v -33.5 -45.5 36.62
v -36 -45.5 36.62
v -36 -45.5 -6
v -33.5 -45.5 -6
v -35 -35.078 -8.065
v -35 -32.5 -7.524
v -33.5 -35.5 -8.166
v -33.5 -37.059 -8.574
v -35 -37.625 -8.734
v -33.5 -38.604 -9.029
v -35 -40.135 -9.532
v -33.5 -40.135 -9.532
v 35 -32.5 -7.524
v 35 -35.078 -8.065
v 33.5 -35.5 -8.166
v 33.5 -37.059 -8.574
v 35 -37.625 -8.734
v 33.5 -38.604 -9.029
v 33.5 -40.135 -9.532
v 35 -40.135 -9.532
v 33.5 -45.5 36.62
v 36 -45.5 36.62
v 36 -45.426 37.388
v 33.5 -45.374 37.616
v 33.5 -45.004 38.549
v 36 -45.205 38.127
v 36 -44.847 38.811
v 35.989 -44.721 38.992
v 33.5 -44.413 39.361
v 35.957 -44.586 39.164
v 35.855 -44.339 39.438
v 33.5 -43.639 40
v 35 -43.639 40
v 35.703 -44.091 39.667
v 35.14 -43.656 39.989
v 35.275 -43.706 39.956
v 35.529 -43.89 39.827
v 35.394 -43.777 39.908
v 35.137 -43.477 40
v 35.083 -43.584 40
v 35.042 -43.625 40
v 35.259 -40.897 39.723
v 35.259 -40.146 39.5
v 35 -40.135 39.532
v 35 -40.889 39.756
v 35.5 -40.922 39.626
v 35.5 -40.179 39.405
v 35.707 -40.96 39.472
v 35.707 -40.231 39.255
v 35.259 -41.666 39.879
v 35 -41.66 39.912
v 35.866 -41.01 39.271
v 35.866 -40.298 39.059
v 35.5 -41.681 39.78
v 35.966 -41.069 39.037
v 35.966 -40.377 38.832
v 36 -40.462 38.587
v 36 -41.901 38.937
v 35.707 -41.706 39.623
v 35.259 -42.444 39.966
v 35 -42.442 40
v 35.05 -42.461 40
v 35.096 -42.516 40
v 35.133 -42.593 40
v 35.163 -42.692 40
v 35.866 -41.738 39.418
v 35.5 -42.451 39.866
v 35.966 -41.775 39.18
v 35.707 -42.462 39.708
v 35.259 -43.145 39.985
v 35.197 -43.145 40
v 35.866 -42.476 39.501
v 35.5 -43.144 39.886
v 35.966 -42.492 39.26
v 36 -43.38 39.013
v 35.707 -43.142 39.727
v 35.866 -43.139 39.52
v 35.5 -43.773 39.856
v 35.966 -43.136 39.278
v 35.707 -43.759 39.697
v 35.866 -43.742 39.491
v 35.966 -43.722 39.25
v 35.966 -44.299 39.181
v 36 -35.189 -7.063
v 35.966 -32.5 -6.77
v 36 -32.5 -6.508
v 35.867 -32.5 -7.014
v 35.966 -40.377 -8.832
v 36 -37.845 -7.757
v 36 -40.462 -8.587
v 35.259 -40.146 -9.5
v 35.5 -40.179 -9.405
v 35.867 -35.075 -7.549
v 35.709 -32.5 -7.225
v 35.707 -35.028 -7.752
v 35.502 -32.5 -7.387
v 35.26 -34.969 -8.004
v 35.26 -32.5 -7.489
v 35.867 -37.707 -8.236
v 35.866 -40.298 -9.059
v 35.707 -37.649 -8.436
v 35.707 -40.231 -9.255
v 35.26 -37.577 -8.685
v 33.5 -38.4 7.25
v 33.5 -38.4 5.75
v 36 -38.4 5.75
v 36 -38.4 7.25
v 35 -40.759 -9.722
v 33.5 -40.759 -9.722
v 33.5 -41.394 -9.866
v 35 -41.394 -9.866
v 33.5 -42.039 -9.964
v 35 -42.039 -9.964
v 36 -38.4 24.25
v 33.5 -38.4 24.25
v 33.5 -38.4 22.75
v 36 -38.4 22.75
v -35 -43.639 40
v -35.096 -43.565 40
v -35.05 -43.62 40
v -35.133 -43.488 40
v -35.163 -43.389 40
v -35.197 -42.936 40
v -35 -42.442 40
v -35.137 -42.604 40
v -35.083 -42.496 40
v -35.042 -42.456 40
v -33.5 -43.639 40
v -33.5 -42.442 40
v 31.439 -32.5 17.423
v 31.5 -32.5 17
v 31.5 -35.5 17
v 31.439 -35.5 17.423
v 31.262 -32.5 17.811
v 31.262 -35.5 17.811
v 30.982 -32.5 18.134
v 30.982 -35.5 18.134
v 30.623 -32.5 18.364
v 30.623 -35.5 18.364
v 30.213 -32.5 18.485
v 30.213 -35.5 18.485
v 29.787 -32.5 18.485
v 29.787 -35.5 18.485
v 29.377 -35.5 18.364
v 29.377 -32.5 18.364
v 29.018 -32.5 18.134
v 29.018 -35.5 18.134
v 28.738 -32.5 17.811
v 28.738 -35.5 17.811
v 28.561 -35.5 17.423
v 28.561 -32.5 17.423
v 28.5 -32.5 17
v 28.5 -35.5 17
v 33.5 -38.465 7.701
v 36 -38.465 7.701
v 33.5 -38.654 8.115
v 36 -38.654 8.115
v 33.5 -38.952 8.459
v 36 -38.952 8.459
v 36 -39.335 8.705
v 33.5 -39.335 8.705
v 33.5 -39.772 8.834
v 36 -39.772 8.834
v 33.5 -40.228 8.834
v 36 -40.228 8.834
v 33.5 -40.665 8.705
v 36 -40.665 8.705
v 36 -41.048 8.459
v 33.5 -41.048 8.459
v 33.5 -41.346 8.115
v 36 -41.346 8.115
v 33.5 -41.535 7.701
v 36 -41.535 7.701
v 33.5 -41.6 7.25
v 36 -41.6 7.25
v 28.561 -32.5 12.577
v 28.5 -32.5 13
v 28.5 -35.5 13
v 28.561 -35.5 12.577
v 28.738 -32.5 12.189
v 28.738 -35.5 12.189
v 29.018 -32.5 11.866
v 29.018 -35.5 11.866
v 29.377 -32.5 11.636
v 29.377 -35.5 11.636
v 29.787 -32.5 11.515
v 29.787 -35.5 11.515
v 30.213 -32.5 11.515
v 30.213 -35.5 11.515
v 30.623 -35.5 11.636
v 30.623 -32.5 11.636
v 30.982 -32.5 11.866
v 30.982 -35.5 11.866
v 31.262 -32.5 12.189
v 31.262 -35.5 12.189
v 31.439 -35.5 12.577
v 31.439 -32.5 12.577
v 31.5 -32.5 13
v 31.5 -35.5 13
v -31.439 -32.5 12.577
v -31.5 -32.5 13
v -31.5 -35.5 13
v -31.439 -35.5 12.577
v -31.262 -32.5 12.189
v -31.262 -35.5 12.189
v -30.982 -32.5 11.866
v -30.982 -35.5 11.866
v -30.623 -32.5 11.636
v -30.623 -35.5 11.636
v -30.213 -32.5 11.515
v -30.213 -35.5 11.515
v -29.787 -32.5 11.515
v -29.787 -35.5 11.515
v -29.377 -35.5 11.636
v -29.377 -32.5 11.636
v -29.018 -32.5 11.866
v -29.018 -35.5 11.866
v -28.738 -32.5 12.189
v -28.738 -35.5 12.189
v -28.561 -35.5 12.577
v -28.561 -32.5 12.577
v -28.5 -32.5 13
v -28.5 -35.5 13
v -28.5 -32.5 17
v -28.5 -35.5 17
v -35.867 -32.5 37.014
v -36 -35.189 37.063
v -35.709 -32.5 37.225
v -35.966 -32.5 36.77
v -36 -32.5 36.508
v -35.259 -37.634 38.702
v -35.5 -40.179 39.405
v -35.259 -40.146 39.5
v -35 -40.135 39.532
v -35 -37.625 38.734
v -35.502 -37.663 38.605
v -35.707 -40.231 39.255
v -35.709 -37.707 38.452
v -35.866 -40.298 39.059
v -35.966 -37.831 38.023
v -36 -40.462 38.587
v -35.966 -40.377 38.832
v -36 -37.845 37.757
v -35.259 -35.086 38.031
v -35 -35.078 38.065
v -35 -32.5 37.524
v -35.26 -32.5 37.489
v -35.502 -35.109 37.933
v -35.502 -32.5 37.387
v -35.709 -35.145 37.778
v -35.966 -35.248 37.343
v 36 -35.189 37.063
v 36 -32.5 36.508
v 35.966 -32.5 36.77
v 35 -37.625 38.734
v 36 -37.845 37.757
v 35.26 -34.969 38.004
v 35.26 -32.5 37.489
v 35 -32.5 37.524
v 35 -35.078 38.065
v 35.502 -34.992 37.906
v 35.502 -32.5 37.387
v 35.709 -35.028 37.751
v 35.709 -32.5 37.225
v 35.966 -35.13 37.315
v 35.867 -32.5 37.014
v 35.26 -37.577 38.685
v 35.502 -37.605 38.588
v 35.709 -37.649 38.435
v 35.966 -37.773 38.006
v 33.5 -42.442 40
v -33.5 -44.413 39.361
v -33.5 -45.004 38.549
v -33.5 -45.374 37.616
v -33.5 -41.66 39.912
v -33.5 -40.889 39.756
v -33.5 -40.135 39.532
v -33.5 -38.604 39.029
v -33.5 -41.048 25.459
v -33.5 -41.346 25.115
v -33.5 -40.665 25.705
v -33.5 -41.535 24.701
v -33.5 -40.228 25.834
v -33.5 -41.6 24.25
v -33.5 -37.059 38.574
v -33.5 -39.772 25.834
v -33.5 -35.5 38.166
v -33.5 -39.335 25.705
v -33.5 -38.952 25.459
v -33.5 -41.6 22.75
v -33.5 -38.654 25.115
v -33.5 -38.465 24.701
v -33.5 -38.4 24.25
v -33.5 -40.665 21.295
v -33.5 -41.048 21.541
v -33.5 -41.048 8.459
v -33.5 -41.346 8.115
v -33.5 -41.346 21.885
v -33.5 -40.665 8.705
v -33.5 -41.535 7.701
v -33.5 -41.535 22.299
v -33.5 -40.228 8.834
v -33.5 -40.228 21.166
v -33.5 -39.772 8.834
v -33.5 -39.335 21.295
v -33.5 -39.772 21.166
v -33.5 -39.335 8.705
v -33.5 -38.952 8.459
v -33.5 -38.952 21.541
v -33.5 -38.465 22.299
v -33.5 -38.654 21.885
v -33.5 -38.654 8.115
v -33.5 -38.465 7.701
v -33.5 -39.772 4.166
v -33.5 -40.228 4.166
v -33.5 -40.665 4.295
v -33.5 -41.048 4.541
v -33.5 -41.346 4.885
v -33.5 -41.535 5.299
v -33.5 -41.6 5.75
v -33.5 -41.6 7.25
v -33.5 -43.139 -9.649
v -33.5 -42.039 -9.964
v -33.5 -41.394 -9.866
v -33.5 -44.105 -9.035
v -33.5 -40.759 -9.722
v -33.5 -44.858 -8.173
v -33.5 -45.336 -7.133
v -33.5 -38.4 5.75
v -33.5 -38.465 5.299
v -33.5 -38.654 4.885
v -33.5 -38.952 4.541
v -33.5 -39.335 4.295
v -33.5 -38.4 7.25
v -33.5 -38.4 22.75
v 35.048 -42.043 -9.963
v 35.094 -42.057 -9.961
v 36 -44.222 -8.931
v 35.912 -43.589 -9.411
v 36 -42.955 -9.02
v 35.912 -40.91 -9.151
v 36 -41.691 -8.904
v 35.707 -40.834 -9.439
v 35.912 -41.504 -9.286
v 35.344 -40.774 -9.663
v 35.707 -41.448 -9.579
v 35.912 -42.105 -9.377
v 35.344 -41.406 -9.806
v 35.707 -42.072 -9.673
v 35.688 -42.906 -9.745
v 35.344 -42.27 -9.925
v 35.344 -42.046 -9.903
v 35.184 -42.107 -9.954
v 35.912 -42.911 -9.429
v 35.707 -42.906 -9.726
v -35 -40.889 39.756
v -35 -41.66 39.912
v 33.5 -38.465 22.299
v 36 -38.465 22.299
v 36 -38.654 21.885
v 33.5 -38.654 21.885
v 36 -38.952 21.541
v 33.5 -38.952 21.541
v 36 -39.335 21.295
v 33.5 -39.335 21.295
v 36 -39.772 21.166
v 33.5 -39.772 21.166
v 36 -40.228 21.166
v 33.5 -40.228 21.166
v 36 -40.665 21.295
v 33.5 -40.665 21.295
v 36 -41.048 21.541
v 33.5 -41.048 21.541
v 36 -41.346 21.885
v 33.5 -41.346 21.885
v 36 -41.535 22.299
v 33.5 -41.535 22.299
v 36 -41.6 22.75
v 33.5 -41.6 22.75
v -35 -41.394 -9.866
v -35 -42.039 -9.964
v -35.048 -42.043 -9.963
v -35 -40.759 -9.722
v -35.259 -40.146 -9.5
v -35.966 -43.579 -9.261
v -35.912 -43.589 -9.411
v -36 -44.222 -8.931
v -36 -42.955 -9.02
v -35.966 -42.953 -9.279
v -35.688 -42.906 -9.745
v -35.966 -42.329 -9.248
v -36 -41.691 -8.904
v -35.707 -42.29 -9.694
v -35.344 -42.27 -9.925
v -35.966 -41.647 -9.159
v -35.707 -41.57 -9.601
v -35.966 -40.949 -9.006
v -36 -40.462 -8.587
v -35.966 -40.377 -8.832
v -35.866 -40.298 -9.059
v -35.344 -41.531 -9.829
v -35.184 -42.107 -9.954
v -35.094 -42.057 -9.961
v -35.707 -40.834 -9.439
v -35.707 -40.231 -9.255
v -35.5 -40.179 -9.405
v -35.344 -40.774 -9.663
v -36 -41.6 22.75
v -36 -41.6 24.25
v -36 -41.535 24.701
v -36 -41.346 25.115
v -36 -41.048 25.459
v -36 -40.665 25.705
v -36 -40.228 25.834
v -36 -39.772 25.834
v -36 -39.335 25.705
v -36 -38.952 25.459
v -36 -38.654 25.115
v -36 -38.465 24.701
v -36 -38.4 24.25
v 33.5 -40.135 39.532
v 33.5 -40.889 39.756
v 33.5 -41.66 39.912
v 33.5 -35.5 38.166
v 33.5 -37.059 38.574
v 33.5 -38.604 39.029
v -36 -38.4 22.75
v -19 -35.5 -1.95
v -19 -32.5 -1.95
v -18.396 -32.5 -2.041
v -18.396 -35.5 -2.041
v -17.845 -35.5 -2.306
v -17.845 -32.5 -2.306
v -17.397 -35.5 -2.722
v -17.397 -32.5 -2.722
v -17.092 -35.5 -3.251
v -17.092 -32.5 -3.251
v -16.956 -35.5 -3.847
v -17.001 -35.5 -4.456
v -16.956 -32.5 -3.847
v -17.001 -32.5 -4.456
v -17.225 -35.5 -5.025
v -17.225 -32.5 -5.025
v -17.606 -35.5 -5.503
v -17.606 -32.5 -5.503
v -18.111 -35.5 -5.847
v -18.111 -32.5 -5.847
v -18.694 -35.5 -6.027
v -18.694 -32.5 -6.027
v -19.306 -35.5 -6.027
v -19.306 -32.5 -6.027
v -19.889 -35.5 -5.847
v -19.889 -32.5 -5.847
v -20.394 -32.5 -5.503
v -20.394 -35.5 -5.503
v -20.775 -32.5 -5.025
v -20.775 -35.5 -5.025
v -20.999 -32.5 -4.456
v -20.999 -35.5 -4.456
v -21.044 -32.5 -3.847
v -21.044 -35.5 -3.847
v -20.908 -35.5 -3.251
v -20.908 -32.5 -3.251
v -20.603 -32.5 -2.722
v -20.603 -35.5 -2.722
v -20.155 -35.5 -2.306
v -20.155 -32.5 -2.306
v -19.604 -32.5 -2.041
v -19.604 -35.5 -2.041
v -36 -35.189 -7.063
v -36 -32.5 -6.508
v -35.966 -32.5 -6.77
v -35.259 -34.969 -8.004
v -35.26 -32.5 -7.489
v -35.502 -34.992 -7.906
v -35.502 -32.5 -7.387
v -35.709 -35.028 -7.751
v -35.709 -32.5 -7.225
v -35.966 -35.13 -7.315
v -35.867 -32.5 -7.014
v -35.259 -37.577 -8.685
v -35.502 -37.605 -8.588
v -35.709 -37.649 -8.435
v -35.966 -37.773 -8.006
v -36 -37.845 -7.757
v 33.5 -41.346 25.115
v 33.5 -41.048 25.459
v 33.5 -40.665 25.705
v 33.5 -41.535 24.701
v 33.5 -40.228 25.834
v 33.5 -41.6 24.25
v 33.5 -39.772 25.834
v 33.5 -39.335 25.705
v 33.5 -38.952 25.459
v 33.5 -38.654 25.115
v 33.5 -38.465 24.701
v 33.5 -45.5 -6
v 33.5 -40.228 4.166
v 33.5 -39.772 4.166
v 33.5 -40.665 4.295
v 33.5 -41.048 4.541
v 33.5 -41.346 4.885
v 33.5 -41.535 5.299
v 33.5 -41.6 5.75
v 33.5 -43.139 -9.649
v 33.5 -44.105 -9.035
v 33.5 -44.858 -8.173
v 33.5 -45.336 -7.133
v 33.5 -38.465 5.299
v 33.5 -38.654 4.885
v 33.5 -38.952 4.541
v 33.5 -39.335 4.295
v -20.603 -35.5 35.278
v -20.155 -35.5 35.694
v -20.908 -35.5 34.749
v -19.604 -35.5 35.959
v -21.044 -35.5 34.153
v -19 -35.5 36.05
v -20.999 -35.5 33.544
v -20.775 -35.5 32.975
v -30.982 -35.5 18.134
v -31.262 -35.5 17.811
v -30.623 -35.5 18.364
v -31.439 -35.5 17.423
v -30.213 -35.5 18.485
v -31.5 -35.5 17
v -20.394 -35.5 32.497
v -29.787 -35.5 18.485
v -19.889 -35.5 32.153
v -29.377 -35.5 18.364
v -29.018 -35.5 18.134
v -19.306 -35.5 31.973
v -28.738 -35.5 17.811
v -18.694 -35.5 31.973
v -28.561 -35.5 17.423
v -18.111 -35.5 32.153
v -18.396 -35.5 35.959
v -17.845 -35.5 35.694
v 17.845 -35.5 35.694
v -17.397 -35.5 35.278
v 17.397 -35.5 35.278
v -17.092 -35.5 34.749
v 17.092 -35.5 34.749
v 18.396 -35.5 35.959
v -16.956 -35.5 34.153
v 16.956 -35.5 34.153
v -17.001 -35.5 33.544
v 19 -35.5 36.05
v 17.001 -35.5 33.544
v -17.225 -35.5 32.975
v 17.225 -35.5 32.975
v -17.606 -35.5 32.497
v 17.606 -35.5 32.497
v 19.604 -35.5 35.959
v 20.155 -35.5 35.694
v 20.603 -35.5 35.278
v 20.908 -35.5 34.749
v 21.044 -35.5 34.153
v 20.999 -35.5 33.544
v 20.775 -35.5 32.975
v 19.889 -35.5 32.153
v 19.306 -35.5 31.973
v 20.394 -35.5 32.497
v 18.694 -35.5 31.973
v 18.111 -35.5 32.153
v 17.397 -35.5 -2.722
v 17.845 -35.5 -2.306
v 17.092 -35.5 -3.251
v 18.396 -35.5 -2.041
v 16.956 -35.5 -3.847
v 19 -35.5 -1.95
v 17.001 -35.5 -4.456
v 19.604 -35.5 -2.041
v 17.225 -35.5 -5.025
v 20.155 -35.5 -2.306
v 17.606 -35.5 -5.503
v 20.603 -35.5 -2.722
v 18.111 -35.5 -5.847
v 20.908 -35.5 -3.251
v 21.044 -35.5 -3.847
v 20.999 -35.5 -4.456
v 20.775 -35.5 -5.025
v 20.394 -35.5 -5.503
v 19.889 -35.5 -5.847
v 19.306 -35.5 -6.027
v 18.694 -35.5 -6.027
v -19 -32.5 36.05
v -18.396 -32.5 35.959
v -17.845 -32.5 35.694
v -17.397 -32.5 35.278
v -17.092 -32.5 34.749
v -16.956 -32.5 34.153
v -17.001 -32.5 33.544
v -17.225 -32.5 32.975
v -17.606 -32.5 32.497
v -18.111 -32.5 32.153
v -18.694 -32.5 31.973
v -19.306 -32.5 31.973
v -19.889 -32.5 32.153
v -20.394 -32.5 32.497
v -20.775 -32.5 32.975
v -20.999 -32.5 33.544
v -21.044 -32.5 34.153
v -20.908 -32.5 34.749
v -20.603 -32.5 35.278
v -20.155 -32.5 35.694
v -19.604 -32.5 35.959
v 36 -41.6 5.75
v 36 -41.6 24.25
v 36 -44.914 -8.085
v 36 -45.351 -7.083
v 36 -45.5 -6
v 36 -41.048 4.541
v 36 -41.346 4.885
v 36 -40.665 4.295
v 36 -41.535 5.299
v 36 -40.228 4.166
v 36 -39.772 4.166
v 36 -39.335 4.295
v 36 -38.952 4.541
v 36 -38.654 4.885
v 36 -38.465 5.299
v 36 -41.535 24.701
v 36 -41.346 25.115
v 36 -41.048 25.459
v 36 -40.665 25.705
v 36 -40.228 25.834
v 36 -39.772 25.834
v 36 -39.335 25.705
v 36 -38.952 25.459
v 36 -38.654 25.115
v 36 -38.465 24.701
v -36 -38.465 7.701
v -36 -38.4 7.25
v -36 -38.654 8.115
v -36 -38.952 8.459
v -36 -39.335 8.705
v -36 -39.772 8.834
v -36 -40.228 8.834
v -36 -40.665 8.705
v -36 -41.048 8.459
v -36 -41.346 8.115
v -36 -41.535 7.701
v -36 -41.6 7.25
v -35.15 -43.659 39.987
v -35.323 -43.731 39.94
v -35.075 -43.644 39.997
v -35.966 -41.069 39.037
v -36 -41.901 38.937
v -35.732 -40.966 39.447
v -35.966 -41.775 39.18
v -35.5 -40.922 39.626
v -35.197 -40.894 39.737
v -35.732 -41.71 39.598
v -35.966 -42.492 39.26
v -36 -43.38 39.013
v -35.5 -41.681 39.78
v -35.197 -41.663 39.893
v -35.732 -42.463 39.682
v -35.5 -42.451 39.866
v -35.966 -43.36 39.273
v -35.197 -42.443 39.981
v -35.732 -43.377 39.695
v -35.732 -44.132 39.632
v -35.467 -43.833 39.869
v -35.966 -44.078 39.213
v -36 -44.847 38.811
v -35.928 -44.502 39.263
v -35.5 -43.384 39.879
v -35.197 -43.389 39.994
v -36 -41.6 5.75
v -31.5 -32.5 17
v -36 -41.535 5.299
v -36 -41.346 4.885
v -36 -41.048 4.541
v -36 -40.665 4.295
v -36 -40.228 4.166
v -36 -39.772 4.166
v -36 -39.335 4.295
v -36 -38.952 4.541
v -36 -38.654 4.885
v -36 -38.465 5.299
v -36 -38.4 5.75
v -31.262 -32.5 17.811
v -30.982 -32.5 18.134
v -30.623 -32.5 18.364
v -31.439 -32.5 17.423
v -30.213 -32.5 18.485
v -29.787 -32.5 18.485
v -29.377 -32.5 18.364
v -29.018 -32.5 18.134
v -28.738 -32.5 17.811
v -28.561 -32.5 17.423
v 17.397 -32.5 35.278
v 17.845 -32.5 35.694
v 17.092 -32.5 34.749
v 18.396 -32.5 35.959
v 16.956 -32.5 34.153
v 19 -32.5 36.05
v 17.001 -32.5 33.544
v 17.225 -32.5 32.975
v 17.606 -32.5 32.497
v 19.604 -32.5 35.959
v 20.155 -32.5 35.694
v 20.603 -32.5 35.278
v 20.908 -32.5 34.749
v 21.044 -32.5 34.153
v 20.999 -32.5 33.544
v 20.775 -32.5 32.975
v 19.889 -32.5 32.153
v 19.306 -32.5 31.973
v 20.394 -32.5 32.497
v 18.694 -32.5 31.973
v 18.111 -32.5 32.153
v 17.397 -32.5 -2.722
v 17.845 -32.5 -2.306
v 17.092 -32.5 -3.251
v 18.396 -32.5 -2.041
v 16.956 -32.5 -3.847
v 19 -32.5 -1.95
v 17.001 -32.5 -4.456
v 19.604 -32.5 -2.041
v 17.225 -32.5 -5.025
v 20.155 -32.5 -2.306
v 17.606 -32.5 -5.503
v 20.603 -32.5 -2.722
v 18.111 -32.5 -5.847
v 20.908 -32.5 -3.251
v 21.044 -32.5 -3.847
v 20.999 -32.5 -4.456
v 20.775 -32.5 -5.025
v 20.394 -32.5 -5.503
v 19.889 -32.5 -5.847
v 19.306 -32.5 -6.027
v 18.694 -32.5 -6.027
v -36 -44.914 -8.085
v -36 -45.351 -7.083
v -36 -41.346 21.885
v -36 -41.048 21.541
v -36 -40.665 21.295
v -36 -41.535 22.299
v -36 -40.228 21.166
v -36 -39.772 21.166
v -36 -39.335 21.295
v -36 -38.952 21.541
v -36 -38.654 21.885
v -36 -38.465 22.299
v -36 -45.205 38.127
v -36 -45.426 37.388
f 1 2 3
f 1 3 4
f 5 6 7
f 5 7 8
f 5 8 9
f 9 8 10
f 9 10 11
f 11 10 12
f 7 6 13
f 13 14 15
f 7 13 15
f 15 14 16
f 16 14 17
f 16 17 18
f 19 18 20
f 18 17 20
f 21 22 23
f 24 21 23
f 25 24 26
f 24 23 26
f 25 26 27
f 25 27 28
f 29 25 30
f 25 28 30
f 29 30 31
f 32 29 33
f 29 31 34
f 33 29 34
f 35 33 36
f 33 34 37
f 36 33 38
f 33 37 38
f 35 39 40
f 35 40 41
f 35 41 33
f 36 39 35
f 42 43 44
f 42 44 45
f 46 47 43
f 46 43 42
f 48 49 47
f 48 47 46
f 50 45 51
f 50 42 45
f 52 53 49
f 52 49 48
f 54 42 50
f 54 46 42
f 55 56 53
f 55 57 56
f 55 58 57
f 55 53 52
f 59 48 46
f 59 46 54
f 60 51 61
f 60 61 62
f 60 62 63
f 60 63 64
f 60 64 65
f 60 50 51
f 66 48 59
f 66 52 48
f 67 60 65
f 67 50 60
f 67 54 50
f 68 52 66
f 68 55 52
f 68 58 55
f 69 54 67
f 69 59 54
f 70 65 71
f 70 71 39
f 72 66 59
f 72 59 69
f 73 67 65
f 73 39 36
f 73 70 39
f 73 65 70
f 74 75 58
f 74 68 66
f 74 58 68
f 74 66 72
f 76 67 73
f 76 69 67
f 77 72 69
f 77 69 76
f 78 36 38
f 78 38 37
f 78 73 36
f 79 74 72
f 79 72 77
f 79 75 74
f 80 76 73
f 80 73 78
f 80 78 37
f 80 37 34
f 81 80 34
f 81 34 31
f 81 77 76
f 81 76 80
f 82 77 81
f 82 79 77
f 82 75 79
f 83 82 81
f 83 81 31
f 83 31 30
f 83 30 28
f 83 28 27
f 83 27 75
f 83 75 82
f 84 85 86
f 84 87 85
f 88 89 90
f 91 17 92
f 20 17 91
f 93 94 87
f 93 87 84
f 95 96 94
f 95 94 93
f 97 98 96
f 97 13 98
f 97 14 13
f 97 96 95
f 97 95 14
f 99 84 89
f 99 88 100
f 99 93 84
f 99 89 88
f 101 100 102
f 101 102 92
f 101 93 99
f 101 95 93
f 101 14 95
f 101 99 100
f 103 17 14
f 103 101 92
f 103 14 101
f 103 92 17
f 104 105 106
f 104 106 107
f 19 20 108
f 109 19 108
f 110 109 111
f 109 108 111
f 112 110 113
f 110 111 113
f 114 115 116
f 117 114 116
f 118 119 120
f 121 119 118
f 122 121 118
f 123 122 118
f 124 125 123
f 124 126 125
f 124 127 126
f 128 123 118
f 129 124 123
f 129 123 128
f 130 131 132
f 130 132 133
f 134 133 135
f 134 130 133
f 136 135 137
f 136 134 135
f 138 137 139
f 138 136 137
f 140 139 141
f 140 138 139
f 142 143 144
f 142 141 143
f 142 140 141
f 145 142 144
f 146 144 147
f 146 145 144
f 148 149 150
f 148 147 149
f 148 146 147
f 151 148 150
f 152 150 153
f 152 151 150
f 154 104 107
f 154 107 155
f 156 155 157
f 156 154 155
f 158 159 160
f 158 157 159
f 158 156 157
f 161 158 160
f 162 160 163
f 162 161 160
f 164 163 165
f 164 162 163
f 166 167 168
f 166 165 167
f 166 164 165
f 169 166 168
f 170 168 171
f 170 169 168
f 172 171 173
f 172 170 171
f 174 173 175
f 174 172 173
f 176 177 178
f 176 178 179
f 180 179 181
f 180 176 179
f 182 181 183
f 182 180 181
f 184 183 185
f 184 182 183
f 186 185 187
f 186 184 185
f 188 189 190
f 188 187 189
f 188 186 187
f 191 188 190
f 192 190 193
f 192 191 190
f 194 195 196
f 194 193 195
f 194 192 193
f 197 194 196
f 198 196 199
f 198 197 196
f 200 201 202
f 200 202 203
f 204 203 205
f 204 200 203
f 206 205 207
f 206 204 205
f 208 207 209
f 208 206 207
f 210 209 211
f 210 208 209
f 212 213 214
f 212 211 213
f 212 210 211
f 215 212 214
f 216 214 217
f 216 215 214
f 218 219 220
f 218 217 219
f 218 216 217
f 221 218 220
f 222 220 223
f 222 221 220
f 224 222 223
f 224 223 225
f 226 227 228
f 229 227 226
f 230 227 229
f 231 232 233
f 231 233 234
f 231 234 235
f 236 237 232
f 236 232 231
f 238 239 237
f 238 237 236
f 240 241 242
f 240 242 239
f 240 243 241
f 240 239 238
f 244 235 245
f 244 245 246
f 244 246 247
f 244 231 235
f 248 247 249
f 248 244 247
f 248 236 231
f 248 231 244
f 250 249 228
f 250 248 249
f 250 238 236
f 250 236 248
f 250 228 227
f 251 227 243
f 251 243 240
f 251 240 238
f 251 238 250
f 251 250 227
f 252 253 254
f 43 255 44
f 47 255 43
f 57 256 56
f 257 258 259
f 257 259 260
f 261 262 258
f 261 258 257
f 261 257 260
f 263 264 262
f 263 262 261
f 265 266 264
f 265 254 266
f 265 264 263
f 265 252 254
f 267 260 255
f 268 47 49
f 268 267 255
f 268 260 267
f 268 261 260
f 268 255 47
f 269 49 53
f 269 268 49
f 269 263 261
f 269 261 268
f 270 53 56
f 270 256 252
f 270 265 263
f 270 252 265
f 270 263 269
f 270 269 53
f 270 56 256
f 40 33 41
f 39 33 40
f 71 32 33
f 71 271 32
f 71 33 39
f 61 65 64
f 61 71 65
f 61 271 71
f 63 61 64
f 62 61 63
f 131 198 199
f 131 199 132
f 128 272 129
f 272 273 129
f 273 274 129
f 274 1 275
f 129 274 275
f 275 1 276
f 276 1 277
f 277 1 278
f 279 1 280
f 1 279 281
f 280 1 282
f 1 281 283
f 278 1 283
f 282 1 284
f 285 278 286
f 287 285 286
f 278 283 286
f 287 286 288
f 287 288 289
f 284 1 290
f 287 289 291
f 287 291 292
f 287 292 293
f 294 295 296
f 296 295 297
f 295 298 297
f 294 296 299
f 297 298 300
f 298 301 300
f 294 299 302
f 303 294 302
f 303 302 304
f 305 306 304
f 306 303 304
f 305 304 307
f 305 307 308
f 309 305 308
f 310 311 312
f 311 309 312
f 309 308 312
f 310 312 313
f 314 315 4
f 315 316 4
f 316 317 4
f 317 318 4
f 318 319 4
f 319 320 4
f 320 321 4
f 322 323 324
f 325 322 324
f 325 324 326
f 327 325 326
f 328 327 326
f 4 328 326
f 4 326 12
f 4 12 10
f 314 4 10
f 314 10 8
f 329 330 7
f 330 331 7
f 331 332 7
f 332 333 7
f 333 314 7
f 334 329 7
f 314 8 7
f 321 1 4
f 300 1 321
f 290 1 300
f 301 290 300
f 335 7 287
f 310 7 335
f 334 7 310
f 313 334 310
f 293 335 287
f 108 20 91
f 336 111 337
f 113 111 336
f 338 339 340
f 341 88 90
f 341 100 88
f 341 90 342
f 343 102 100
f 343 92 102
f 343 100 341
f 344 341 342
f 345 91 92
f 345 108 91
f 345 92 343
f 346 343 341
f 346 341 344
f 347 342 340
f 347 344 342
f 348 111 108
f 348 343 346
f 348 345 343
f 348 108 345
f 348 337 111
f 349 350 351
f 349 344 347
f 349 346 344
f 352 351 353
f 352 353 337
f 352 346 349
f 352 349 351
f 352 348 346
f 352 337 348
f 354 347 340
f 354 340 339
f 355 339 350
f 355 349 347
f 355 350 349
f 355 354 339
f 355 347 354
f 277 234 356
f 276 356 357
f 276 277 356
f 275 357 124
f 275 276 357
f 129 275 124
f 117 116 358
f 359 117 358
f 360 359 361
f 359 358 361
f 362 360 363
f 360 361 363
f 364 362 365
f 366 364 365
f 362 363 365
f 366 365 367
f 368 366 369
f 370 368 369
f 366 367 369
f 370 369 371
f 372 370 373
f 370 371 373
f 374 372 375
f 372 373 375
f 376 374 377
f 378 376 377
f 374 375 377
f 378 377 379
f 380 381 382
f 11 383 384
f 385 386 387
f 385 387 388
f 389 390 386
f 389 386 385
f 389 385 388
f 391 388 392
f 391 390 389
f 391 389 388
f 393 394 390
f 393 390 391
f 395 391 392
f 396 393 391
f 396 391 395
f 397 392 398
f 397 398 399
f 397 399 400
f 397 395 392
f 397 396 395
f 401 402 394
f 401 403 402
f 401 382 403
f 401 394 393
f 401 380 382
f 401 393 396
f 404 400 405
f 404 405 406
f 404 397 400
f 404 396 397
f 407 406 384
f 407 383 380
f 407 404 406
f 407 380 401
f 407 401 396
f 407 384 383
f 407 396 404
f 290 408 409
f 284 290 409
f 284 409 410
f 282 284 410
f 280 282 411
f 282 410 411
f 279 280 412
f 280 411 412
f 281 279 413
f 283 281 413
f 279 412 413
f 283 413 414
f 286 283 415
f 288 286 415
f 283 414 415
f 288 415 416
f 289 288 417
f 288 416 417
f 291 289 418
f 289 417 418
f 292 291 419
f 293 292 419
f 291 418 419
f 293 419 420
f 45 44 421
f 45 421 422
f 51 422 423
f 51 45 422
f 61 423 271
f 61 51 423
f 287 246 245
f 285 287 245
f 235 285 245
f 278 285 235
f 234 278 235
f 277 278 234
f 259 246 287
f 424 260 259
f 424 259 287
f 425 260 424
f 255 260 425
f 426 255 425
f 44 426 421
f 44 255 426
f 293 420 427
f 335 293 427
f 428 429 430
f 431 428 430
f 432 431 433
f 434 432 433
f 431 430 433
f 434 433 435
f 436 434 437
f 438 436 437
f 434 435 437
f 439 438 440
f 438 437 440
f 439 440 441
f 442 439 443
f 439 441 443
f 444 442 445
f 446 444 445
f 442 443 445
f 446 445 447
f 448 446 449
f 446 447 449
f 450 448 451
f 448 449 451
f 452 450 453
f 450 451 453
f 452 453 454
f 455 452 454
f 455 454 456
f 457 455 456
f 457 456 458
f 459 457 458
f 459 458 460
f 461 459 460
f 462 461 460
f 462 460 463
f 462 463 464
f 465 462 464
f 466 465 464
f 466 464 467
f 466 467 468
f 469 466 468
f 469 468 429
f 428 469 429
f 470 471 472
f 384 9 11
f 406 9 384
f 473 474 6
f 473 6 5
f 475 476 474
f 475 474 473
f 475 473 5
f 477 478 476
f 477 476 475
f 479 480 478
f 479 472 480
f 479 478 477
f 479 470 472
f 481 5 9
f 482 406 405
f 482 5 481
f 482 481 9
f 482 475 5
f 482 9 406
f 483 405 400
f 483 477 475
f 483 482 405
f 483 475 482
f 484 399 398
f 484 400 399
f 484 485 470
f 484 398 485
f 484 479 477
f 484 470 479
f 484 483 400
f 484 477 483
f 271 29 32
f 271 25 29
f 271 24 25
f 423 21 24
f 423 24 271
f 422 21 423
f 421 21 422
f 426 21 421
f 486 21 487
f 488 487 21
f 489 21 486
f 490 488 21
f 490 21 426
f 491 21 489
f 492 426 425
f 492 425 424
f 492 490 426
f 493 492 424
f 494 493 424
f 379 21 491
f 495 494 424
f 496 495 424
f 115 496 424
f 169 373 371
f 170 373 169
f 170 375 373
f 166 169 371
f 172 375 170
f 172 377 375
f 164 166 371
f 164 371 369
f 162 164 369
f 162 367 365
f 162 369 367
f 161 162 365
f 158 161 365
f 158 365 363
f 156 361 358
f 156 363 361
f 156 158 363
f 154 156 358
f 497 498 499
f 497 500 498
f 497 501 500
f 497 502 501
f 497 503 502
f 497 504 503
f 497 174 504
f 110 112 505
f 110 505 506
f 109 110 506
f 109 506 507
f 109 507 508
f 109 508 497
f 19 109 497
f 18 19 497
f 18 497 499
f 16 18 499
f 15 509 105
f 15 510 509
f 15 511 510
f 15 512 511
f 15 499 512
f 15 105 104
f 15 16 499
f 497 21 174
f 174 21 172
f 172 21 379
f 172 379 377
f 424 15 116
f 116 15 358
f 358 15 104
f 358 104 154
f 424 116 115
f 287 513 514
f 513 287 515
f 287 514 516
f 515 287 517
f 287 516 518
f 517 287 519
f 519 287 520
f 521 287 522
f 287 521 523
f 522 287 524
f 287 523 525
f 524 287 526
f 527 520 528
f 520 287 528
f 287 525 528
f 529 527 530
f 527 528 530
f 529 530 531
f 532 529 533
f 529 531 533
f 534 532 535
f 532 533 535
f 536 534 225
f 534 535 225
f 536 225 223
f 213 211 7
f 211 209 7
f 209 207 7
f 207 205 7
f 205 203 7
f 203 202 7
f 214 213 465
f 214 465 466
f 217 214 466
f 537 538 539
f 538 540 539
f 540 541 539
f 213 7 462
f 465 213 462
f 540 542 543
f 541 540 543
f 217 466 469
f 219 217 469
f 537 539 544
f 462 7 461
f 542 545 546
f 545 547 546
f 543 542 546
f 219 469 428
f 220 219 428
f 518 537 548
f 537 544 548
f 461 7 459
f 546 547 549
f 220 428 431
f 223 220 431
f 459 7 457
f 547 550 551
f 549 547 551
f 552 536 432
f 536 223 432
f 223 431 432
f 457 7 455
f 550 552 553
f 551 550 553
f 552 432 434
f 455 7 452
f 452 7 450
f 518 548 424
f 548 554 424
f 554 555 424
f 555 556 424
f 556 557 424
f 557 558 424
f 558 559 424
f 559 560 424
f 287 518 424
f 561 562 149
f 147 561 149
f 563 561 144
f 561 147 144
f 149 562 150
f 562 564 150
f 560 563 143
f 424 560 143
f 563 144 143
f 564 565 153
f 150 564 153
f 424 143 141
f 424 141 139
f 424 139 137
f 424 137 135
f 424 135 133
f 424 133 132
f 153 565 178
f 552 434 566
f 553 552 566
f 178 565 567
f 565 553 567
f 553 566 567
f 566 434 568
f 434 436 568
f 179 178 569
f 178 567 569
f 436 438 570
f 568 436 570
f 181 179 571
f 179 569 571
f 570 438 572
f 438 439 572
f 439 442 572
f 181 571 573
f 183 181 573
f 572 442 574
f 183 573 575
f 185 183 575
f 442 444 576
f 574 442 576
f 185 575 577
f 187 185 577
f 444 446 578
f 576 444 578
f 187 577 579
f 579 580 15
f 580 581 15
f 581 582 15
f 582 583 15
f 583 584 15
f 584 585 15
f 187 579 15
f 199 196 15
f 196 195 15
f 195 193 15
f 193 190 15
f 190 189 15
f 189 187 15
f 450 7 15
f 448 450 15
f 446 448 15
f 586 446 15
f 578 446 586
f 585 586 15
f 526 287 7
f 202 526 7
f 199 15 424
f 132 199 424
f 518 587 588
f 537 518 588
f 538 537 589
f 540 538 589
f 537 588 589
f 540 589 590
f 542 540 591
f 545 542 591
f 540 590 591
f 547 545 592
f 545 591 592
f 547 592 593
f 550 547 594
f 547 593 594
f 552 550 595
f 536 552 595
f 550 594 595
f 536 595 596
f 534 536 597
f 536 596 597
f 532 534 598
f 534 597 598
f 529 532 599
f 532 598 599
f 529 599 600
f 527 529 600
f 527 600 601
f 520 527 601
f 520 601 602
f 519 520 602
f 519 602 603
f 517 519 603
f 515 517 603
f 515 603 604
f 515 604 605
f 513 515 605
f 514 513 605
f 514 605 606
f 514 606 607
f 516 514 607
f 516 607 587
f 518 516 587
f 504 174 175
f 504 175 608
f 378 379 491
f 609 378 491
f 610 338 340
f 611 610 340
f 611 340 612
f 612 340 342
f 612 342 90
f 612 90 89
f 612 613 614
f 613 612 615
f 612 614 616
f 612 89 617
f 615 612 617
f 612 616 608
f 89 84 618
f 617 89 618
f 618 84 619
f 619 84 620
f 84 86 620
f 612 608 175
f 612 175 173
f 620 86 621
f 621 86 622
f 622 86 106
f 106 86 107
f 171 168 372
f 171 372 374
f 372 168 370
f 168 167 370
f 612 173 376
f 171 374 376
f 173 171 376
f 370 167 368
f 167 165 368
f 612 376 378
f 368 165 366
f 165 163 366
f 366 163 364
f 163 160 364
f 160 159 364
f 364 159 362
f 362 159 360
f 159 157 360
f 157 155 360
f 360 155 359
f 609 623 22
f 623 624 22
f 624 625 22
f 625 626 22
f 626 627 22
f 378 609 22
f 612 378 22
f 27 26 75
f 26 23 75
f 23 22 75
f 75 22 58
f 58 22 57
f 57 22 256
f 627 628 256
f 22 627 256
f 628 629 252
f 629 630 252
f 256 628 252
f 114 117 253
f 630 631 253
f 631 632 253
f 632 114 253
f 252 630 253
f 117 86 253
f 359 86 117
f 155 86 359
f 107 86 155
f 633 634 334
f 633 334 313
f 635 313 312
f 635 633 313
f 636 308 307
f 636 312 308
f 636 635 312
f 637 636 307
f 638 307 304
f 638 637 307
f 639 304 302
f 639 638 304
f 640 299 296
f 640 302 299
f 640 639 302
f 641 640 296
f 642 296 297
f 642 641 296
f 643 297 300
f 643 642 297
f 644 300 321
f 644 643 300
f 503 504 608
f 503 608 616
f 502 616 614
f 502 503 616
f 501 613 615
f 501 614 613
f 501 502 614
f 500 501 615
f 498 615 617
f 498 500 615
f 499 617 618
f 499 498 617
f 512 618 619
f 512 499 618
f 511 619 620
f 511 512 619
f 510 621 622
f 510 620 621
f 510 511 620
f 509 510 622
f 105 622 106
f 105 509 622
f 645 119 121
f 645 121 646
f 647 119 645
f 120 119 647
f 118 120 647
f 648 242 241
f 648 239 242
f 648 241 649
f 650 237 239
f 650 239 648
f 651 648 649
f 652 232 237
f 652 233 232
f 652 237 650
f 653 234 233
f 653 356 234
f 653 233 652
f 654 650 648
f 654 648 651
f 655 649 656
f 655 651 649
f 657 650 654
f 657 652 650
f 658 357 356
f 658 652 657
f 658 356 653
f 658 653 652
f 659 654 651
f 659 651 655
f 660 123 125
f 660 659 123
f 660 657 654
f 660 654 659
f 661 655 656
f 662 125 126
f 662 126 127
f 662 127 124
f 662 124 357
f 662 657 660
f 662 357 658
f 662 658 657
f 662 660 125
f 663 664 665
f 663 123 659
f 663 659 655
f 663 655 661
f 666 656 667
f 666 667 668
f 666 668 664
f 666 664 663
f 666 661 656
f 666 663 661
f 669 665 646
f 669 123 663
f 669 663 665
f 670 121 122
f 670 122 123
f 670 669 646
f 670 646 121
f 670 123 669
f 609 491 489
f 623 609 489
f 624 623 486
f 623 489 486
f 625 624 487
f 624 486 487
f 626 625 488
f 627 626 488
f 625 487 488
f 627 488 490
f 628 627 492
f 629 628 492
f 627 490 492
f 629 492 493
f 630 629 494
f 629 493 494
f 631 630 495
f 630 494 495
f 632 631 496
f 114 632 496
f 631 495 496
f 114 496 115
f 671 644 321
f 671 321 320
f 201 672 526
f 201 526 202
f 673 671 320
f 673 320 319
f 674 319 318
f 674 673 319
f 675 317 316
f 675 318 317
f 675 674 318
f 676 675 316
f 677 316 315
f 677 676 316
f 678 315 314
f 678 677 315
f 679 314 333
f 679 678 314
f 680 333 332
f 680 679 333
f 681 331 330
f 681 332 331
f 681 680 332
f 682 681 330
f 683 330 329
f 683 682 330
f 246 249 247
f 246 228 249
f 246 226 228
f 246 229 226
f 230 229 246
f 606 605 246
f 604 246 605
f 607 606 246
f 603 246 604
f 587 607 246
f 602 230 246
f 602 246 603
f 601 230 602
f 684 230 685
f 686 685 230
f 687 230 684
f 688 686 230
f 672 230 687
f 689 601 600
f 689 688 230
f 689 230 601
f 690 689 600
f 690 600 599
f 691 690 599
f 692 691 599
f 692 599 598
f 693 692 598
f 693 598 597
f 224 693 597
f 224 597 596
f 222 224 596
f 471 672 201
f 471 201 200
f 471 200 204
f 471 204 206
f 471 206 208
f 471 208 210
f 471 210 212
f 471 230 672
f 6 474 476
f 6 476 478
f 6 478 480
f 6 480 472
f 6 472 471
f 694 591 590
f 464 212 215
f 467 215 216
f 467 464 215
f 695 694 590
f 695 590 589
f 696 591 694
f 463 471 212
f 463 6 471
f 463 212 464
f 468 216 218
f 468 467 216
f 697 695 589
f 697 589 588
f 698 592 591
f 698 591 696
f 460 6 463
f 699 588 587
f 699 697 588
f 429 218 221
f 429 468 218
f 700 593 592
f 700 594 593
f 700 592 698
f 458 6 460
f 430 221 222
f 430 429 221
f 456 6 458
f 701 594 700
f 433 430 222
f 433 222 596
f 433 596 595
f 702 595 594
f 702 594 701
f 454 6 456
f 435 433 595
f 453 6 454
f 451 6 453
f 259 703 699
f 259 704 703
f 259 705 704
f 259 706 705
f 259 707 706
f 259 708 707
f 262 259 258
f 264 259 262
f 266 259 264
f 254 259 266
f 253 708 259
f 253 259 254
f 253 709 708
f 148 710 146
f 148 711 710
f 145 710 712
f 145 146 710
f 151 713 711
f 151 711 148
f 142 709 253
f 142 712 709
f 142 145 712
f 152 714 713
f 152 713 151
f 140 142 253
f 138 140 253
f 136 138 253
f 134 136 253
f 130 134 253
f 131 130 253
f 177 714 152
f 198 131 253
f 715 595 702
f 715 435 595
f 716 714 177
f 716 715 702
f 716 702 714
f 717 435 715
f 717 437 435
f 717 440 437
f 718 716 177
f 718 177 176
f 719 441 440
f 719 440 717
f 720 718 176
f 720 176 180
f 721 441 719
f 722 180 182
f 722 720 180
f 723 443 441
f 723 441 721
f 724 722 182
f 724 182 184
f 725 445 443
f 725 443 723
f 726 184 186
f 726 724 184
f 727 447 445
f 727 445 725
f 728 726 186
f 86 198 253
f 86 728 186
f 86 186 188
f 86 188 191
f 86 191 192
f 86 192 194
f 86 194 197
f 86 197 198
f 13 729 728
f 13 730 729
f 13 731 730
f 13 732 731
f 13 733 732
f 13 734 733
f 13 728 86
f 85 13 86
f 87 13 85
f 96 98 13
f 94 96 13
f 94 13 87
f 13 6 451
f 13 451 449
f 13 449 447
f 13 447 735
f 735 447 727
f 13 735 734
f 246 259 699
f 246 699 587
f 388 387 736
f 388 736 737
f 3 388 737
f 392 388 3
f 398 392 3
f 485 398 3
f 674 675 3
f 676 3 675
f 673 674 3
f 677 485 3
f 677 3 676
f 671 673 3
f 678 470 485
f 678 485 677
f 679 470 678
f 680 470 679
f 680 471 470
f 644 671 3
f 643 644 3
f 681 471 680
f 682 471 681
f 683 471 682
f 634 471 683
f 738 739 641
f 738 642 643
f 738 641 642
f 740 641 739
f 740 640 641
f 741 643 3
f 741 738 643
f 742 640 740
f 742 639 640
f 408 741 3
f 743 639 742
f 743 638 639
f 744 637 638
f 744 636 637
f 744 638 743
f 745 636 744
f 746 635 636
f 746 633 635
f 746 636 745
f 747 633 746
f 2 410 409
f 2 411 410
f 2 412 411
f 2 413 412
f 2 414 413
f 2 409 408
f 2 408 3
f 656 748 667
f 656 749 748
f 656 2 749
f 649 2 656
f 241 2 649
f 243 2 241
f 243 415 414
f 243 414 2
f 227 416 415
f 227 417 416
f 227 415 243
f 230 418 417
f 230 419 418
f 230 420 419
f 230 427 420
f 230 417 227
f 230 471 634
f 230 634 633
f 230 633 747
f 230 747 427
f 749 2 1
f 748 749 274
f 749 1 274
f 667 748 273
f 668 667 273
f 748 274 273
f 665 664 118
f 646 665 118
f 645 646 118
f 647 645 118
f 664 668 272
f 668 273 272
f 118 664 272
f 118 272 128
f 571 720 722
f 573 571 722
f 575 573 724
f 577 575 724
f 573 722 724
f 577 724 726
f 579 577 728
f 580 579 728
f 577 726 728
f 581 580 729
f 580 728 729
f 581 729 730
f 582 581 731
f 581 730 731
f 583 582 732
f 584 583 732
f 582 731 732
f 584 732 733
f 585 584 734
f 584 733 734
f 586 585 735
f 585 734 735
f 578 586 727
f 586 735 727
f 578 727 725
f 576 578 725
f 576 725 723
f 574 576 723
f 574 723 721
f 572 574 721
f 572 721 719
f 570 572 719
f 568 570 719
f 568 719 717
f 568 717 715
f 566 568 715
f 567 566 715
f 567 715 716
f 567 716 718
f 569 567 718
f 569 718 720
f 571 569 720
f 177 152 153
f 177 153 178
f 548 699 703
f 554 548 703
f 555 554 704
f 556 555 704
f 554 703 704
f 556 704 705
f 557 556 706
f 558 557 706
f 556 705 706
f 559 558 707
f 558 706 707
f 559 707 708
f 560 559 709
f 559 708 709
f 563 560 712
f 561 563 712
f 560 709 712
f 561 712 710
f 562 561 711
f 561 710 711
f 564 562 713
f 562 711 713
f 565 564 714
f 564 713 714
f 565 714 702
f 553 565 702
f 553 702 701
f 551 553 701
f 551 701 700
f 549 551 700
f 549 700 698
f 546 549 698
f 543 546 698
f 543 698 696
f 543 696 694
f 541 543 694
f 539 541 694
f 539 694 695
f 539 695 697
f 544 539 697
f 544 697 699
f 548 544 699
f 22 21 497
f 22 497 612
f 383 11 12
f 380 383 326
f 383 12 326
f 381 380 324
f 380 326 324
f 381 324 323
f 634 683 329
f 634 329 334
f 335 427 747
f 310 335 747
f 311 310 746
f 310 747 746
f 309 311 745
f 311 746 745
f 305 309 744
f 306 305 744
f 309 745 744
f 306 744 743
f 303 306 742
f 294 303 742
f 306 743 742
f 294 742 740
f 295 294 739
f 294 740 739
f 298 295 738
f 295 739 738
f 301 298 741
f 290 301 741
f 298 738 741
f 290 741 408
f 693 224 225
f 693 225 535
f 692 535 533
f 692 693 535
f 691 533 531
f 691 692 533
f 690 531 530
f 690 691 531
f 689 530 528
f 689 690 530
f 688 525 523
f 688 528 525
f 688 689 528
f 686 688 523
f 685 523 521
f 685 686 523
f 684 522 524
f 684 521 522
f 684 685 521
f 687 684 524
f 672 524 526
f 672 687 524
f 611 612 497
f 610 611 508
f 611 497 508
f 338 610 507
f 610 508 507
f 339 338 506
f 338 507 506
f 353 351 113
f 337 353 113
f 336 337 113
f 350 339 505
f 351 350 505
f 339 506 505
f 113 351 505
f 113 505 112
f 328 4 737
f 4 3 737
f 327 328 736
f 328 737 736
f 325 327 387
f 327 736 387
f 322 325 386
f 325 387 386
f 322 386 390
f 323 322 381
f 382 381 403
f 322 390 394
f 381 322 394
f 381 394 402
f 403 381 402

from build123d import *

# Parameters (mm, degrees)
BOSS_EXTRUDE1_DEPTH      = 40
BOSS_EXTRUDE1_DEPTH_BACK = 10
SKETCH1_W                = 73
SKETCH1_H                = 3
SKETCH1_W_2              = 3
SKETCH1_H_2              = 10
SKETCH5_R                = 2.05
CUT_EXTRUDE2_DEPTH       = 5.1
CUT_EXTRUDE3_DEPTH       = 82
SKETCH9_W                = 50
SKETCH9_H                = 13
CUT_EXTRUDE4_DEPTH       = 0.5
CUT_EXTRUDE5_DEPTH       = 98.5
FILLET2_R                = 4
FILLET3_R                = 1


with BuildPart() as part:
    # Sketch1 → Boss-Extrude1 (new, two sides: drawn at the far end of the back side and taken through both)
    with BuildSketch(Plane.XY.offset(-BOSS_EXTRUDE1_DEPTH_BACK)):
        with Locations((0, -34)):
            Rectangle(SKETCH1_W, SKETCH1_H)
        with Locations((35, -40.5)):
            Rectangle(SKETCH1_W_2, SKETCH1_H_2)
        with Locations((-35, -40.5)):
            Rectangle(SKETCH1_W_2, SKETCH1_H_2)
    extrude(amount=BOSS_EXTRUDE1_DEPTH + BOSS_EXTRUDE1_DEPTH_BACK)

    # Sketch5 → Cut-Extrude2 (cut)
    with BuildSketch(Plane(origin=(0, -32.5, 0), x_dir=(1, 0, 0), z_dir=(0, 1, 0))):
        with Locations(Location((-19, 4, 0), (0, 0, 270))):
            Circle(SKETCH5_R)
        with Locations(Location((19, 4, 0), (0, 0, 270))):
            Circle(SKETCH5_R)
        with Locations(Location((19, -34, 0), (0, 0, 270))):
            Circle(SKETCH5_R)
        with Locations(Location((-19, -34, 0), (0, 0, 270))):
            Circle(SKETCH5_R)
        with BuildLine():
            Line((-31.5, -17), (-31.5, -13))
            ThreePointArc((-31.5, -13), (-30, -11.5), (-28.5, -13))
            Line((-28.5, -13), (-28.5, -17))
            ThreePointArc((-28.5, -17), (-30, -18.5), (-31.5, -17))
        make_face()
        with BuildLine():
            Line((31.5, -13), (31.5, -17))
            ThreePointArc((31.5, -17), (30, -18.5), (28.5, -17))
            Line((28.5, -17), (28.5, -13))
            ThreePointArc((28.5, -13), (30, -11.5), (31.5, -13))
        make_face()
    extrude(amount=-CUT_EXTRUDE2_DEPTH, mode=Mode.SUBTRACT)

    # Sketch8 → Cut-Extrude3 (cut)
    with BuildSketch(Plane.ZY.offset(36.5)):
        with BuildLine():
            Line((5.75, -38.4), (7.25, -38.4))
            ThreePointArc((7.25, -38.4), (8.85, -40), (7.25, -41.6))
            Line((7.25, -41.6), (5.75, -41.6))
            ThreePointArc((5.75, -41.6), (4.15, -40), (5.75, -38.4))
        make_face()
        with BuildLine():
            Line((24.25, -38.4), (22.75, -38.4))
            ThreePointArc((22.75, -38.4), (21.15, -40), (22.75, -41.6))
            Line((22.75, -41.6), (24.25, -41.6))
            ThreePointArc((24.25, -41.6), (25.85, -40), (24.25, -38.4))
        make_face()
    extrude(amount=-CUT_EXTRUDE3_DEPTH, mode=Mode.SUBTRACT)

    # Sketch9 → Cut-Extrude4 (cut)
    with BuildSketch(Plane.ZY.offset(36.5)):
        with Locations((15, -39)):
            Rectangle(SKETCH9_W, SKETCH9_H)
    cut_extrude4 = extrude(amount=-CUT_EXTRUDE4_DEPTH, mode=Mode.SUBTRACT)

    # Mirror1: Cut-Extrude4 across plane
    add(cut_extrude4.mirror(Plane(origin=(0, 0, 0), x_dir=(0, 0, 1), z_dir=(1, 0, 0))), mode=Mode.SUBTRACT)

    # Sketch10 → Cut-Extrude5 (cut)
    with BuildSketch(Plane(origin=(36, 0, 0), x_dir=(0, 0, -1), z_dir=(1, 0, 0))):
        with BuildLine():
            Line((-39.673112404, -45.5), (-40.667568966, -46.550213702))
            Line((-40.667568966, -46.550213702), (-44.63224415, -43))
            Line((-44.63224415, -43), (-42.018495325, -33.98072497))
            Line((-42.018495325, -33.98072497), (-39.463482429, -29.927945893))
            Line((-39.463482429, -29.927945893), (-37.524182533, -32.5))
            ThreePointArc((-37.524182533, -32.5), (-38.383444331, -36.355587887), (-39.532044935, -40.135085929))
            ThreePointArc((-39.532044935, -40.135085929), (-40.017082913, -42.806643803), (-39.673112404, -45.5))
        make_face()
    cut_extrude5 = extrude(amount=-CUT_EXTRUDE5_DEPTH, mode=Mode.SUBTRACT)

    # Fillet2
    # the kernel refuses this fillet: 4 mm, written as the material it takes off along each edge
    with BuildSketch(Plane(origin=(23.5, -45.5, -10), x_dir=(0, 1, 0), z_dir=(1, 0, 0)), Plane(origin=(-46, -45.5, -10), x_dir=(0, 1, 0), z_dir=(1, 0, 0))) as fillet2_piece_1:
        with BuildLine():
            CenterArc((FILLET2_R, FILLET2_R), FILLET2_R, 180, 90)
            Line((0, FILLET2_R), (-FILLET2_R * 0.02, FILLET2_R))
            Line((-FILLET2_R * 0.02, FILLET2_R), (-FILLET2_R * 0.02, -FILLET2_R * 0.02))
            Line((-FILLET2_R * 0.02, -FILLET2_R * 0.02), (FILLET2_R, -FILLET2_R * 0.02))
            Line((FILLET2_R, -FILLET2_R * 0.02), (FILLET2_R, 0))
        make_face()
    extrude(amount=22.5, mode=Mode.SUBTRACT)
    with BuildSketch(Plane(origin=(43.633505106, -45.5, 39.673112404), x_dir=(0, 0, -1), z_dir=(-1, 0, 0)), Plane(origin=(-25.866494894, -45.5, 39.673112404), x_dir=(0, 0, -1), z_dir=(-1, 0, 0))) as fillet2_piece_2:
        with BuildLine():
            CenterArc((3.053402042, -4), FILLET2_R, 90, 57.679694788)
            Line((-0.326887596, -1.861392518), (-0.394493388, -1.818620368))
            ThreePointArc((-0.394493388, -1.818620368), (-0.291841099, -0.908147826), (-0.076877032, 0.022134181))
            Line((-0.076877032, 0.022134181), (0, 0.08))
            Line((0, 0.08), (3.053402042, 0.08))
            Line((3.053402042, 0.08), (3.053402042, 0))
        make_face()
    extrude(amount=17.767010212, mode=Mode.SUBTRACT)

    # Mirror2: Cut-Extrude5 across plane
    add(cut_extrude5.mirror(Plane.XY.offset(15)), mode=Mode.SUBTRACT)

    # Fillet3
    # the kernel refuses this fillet: 1 mm, written as the material it takes off along each edge
    with BuildSketch(Plane(origin=(36, -43.040322305, -1.130093667), x_dir=(0, 0.32679600244698914, -0.9450949014700414), z_dir=(0, 0.9450949014700414, 0.32679600244698914))) as fillet3_piece_1:
        with BuildLine():
            CenterArc((8.890060939 - FILLET3_R, FILLET3_R), FILLET3_R, 270, 90)
            Line((8.890060939 - FILLET3_R, 0), (8.890060939 - FILLET3_R, -FILLET3_R * 0.02))
            Line((8.890060939 - FILLET3_R, -FILLET3_R * 0.02), (8.890060939 + FILLET3_R * 0.02, -FILLET3_R * 0.02))
            Line((8.890060939 + FILLET3_R * 0.02, -FILLET3_R * 0.02), (8.890060939 + FILLET3_R * 0.02, FILLET3_R))
            Line((8.890060939 + FILLET3_R * 0.02, FILLET3_R), (8.890060939, FILLET3_R))
        make_face()
    revolve(axis=Axis((36, -43.040322305, -1.130093667), (-1, 0, 0)), revolution_arc=51.275424055, mode=Mode.SUBTRACT)
    with BuildSketch(Plane(origin=(36, -43.040322305, 31.130093667), x_dir=(0, 0.32679600244698914, 0.9450949014700414), z_dir=(0, 0.9450949014700414, -0.32679600244698914))) as fillet3_piece_2:
        with BuildLine():
            CenterArc((8.890060939 - FILLET3_R, -FILLET3_R), FILLET3_R, 0, 90)
            Line((8.890060939 - FILLET3_R, 0), (8.890060939 - FILLET3_R, FILLET3_R * 0.02))
            Line((8.890060939 - FILLET3_R, FILLET3_R * 0.02), (8.890060939 + FILLET3_R * 0.02, FILLET3_R * 0.02))
            Line((8.890060939 + FILLET3_R * 0.02, FILLET3_R * 0.02), (8.890060939 + FILLET3_R * 0.02, -FILLET3_R))
            Line((8.890060939 + FILLET3_R * 0.02, -FILLET3_R), (8.890060939, -FILLET3_R))
        make_face()
    revolve(axis=Axis((36, -43.040322305, 31.130093667), (1, 0, 0)), revolution_arc=53.885597182, mode=Mode.SUBTRACT)
    with BuildSketch(Plane(origin=(-36, -43.040322305, -1.130093667), x_dir=(0, -0.532891092697407, -0.8461838354186183), z_dir=(0, -0.8461838354186183, 0.532891092697407))) as fillet3_piece_3:
        with BuildLine():
            CenterArc((8.890060939 - FILLET3_R, FILLET3_R), FILLET3_R, 270, 90)
            Line((8.890060939, FILLET3_R), (8.890060939 + FILLET3_R * 0.02, FILLET3_R))
            Line((8.890060939 + FILLET3_R * 0.02, FILLET3_R), (8.890060939 + FILLET3_R * 0.02, -FILLET3_R * 0.02))
            Line((8.890060939 + FILLET3_R * 0.02, -FILLET3_R * 0.02), (8.890060939 - FILLET3_R, -FILLET3_R * 0.02))
            Line((8.890060939 - FILLET3_R, -FILLET3_R * 0.02), (8.890060939 - FILLET3_R, 0))
        make_face()
    revolve(axis=Axis((-36, -43.040322305, -1.130093667), (1, 0, 0)), revolution_arc=51.275424055, mode=Mode.SUBTRACT)
    with BuildSketch(Plane(origin=(-36, -43.040322305, 31.130093667), x_dir=(0, 0.32679600244698914, 0.9450949014700414), z_dir=(0, 0.9450949014700414, -0.32679600244698914))) as fillet3_piece_4:
        with BuildLine():
            CenterArc((8.890060939 - FILLET3_R, FILLET3_R), FILLET3_R, 270, 90)
            Line((8.890060939 - FILLET3_R, 0), (8.890060939 - FILLET3_R, -FILLET3_R * 0.02))
            Line((8.890060939 - FILLET3_R, -FILLET3_R * 0.02), (8.890060939 + FILLET3_R * 0.02, -FILLET3_R * 0.02))
            Line((8.890060939 + FILLET3_R * 0.02, -FILLET3_R * 0.02), (8.890060939 + FILLET3_R * 0.02, FILLET3_R))
            Line((8.890060939 + FILLET3_R * 0.02, FILLET3_R), (8.890060939, FILLET3_R))
        make_face()
    revolve(axis=Axis((-36, -43.040322305, 31.130093667), (1, 0, 0)), revolution_arc=53.885597182, mode=Mode.SUBTRACT)
    with BuildSketch(Plane(origin=(36, -23.090673742, -58.824529959), x_dir=(0, -0.06631180934399998, 0.9977989496594617), z_dir=(0, 0.9977989496594617, 0.06631180934399998))) as fillet3_piece_5:
        with BuildLine():
            CenterArc((52.156122044 + FILLET3_R, -FILLET3_R), FILLET3_R, 90, 90)
            Line((52.156122044 + FILLET3_R, 0), (52.156122044 + FILLET3_R, FILLET3_R * 0.02))
            Line((52.156122044 + FILLET3_R, FILLET3_R * 0.02), (52.156122044 - FILLET3_R * 0.02, FILLET3_R * 0.02))
            Line((52.156122044 - FILLET3_R * 0.02, FILLET3_R * 0.02), (52.156122044 - FILLET3_R * 0.02, -FILLET3_R))
            Line((52.156122044 - FILLET3_R * 0.02, -FILLET3_R), (52.156122044, -FILLET3_R))
        make_face()
    revolve(axis=Axis((36, -23.090673742, -58.824529959), (1, 0, 0)), revolution_arc=15.272244004, mode=Mode.SUBTRACT)
    with BuildSketch(Plane(origin=(36, -23.090673742, 88.824529959), x_dir=(0, -0.06631180934399998, -0.9977989496594617), z_dir=(0, 0.9977989496594617, -0.06631180934399998))) as fillet3_piece_6:
        with BuildLine():
            CenterArc((52.156122044 + FILLET3_R, FILLET3_R), FILLET3_R, 180, 90)
            Line((52.156122044 + FILLET3_R, 0), (52.156122044 + FILLET3_R, -FILLET3_R * 0.02))
            Line((52.156122044 + FILLET3_R, -FILLET3_R * 0.02), (52.156122044 - FILLET3_R * 0.02, -FILLET3_R * 0.02))
            Line((52.156122044 - FILLET3_R * 0.02, -FILLET3_R * 0.02), (52.156122044 - FILLET3_R * 0.02, FILLET3_R))
            Line((52.156122044 - FILLET3_R * 0.02, FILLET3_R), (52.156122044, FILLET3_R))
        make_face()
    revolve(axis=Axis((36, -23.090673742, 88.824529959), (-1, 0, 0)), revolution_arc=15.272244004, mode=Mode.SUBTRACT)
    with BuildSketch(Plane(origin=(-36, -23.090673742, -58.824529959), x_dir=(0, -0.06631180934399998, 0.9977989496594617), z_dir=(0, 0.9977989496594617, 0.06631180934399998))) as fillet3_piece_7:
        with BuildLine():
            CenterArc((52.156122044 + FILLET3_R, FILLET3_R), FILLET3_R, 180, 90)
            Line((52.156122044 + FILLET3_R, 0), (52.156122044 + FILLET3_R, -FILLET3_R * 0.02))
            Line((52.156122044 + FILLET3_R, -FILLET3_R * 0.02), (52.156122044 - FILLET3_R * 0.02, -FILLET3_R * 0.02))
            Line((52.156122044 - FILLET3_R * 0.02, -FILLET3_R * 0.02), (52.156122044 - FILLET3_R * 0.02, FILLET3_R))
            Line((52.156122044 - FILLET3_R * 0.02, FILLET3_R), (52.156122044, FILLET3_R))
        make_face()
    revolve(axis=Axis((-36, -23.090673742, -58.824529959), (1, 0, 0)), revolution_arc=15.272244004, mode=Mode.SUBTRACT)
    with BuildSketch(Plane(origin=(-36, -23.090673742, 88.824529959), x_dir=(0, -0.32679600244698953, -0.9450949014700414), z_dir=(0, -0.9450949014700414, 0.32679600244698953))) as fillet3_piece_8:
        with BuildLine():
            CenterArc((52.156122044 + FILLET3_R, FILLET3_R), FILLET3_R, 180, 90)
            Line((52.156122044 + FILLET3_R, 0), (52.156122044 + FILLET3_R, -FILLET3_R * 0.02))
            Line((52.156122044 + FILLET3_R, -FILLET3_R * 0.02), (52.156122044 - FILLET3_R * 0.02, -FILLET3_R * 0.02))
            Line((52.156122044 - FILLET3_R * 0.02, -FILLET3_R * 0.02), (52.156122044 - FILLET3_R * 0.02, FILLET3_R))
            Line((52.156122044 - FILLET3_R * 0.02, FILLET3_R), (52.156122044, FILLET3_R))
        make_face()
    revolve(axis=Axis((-36, -23.090673742, 88.824529959), (1, 0, 0)), revolution_arc=15.272244004, mode=Mode.SUBTRACT)


solid = part.part
